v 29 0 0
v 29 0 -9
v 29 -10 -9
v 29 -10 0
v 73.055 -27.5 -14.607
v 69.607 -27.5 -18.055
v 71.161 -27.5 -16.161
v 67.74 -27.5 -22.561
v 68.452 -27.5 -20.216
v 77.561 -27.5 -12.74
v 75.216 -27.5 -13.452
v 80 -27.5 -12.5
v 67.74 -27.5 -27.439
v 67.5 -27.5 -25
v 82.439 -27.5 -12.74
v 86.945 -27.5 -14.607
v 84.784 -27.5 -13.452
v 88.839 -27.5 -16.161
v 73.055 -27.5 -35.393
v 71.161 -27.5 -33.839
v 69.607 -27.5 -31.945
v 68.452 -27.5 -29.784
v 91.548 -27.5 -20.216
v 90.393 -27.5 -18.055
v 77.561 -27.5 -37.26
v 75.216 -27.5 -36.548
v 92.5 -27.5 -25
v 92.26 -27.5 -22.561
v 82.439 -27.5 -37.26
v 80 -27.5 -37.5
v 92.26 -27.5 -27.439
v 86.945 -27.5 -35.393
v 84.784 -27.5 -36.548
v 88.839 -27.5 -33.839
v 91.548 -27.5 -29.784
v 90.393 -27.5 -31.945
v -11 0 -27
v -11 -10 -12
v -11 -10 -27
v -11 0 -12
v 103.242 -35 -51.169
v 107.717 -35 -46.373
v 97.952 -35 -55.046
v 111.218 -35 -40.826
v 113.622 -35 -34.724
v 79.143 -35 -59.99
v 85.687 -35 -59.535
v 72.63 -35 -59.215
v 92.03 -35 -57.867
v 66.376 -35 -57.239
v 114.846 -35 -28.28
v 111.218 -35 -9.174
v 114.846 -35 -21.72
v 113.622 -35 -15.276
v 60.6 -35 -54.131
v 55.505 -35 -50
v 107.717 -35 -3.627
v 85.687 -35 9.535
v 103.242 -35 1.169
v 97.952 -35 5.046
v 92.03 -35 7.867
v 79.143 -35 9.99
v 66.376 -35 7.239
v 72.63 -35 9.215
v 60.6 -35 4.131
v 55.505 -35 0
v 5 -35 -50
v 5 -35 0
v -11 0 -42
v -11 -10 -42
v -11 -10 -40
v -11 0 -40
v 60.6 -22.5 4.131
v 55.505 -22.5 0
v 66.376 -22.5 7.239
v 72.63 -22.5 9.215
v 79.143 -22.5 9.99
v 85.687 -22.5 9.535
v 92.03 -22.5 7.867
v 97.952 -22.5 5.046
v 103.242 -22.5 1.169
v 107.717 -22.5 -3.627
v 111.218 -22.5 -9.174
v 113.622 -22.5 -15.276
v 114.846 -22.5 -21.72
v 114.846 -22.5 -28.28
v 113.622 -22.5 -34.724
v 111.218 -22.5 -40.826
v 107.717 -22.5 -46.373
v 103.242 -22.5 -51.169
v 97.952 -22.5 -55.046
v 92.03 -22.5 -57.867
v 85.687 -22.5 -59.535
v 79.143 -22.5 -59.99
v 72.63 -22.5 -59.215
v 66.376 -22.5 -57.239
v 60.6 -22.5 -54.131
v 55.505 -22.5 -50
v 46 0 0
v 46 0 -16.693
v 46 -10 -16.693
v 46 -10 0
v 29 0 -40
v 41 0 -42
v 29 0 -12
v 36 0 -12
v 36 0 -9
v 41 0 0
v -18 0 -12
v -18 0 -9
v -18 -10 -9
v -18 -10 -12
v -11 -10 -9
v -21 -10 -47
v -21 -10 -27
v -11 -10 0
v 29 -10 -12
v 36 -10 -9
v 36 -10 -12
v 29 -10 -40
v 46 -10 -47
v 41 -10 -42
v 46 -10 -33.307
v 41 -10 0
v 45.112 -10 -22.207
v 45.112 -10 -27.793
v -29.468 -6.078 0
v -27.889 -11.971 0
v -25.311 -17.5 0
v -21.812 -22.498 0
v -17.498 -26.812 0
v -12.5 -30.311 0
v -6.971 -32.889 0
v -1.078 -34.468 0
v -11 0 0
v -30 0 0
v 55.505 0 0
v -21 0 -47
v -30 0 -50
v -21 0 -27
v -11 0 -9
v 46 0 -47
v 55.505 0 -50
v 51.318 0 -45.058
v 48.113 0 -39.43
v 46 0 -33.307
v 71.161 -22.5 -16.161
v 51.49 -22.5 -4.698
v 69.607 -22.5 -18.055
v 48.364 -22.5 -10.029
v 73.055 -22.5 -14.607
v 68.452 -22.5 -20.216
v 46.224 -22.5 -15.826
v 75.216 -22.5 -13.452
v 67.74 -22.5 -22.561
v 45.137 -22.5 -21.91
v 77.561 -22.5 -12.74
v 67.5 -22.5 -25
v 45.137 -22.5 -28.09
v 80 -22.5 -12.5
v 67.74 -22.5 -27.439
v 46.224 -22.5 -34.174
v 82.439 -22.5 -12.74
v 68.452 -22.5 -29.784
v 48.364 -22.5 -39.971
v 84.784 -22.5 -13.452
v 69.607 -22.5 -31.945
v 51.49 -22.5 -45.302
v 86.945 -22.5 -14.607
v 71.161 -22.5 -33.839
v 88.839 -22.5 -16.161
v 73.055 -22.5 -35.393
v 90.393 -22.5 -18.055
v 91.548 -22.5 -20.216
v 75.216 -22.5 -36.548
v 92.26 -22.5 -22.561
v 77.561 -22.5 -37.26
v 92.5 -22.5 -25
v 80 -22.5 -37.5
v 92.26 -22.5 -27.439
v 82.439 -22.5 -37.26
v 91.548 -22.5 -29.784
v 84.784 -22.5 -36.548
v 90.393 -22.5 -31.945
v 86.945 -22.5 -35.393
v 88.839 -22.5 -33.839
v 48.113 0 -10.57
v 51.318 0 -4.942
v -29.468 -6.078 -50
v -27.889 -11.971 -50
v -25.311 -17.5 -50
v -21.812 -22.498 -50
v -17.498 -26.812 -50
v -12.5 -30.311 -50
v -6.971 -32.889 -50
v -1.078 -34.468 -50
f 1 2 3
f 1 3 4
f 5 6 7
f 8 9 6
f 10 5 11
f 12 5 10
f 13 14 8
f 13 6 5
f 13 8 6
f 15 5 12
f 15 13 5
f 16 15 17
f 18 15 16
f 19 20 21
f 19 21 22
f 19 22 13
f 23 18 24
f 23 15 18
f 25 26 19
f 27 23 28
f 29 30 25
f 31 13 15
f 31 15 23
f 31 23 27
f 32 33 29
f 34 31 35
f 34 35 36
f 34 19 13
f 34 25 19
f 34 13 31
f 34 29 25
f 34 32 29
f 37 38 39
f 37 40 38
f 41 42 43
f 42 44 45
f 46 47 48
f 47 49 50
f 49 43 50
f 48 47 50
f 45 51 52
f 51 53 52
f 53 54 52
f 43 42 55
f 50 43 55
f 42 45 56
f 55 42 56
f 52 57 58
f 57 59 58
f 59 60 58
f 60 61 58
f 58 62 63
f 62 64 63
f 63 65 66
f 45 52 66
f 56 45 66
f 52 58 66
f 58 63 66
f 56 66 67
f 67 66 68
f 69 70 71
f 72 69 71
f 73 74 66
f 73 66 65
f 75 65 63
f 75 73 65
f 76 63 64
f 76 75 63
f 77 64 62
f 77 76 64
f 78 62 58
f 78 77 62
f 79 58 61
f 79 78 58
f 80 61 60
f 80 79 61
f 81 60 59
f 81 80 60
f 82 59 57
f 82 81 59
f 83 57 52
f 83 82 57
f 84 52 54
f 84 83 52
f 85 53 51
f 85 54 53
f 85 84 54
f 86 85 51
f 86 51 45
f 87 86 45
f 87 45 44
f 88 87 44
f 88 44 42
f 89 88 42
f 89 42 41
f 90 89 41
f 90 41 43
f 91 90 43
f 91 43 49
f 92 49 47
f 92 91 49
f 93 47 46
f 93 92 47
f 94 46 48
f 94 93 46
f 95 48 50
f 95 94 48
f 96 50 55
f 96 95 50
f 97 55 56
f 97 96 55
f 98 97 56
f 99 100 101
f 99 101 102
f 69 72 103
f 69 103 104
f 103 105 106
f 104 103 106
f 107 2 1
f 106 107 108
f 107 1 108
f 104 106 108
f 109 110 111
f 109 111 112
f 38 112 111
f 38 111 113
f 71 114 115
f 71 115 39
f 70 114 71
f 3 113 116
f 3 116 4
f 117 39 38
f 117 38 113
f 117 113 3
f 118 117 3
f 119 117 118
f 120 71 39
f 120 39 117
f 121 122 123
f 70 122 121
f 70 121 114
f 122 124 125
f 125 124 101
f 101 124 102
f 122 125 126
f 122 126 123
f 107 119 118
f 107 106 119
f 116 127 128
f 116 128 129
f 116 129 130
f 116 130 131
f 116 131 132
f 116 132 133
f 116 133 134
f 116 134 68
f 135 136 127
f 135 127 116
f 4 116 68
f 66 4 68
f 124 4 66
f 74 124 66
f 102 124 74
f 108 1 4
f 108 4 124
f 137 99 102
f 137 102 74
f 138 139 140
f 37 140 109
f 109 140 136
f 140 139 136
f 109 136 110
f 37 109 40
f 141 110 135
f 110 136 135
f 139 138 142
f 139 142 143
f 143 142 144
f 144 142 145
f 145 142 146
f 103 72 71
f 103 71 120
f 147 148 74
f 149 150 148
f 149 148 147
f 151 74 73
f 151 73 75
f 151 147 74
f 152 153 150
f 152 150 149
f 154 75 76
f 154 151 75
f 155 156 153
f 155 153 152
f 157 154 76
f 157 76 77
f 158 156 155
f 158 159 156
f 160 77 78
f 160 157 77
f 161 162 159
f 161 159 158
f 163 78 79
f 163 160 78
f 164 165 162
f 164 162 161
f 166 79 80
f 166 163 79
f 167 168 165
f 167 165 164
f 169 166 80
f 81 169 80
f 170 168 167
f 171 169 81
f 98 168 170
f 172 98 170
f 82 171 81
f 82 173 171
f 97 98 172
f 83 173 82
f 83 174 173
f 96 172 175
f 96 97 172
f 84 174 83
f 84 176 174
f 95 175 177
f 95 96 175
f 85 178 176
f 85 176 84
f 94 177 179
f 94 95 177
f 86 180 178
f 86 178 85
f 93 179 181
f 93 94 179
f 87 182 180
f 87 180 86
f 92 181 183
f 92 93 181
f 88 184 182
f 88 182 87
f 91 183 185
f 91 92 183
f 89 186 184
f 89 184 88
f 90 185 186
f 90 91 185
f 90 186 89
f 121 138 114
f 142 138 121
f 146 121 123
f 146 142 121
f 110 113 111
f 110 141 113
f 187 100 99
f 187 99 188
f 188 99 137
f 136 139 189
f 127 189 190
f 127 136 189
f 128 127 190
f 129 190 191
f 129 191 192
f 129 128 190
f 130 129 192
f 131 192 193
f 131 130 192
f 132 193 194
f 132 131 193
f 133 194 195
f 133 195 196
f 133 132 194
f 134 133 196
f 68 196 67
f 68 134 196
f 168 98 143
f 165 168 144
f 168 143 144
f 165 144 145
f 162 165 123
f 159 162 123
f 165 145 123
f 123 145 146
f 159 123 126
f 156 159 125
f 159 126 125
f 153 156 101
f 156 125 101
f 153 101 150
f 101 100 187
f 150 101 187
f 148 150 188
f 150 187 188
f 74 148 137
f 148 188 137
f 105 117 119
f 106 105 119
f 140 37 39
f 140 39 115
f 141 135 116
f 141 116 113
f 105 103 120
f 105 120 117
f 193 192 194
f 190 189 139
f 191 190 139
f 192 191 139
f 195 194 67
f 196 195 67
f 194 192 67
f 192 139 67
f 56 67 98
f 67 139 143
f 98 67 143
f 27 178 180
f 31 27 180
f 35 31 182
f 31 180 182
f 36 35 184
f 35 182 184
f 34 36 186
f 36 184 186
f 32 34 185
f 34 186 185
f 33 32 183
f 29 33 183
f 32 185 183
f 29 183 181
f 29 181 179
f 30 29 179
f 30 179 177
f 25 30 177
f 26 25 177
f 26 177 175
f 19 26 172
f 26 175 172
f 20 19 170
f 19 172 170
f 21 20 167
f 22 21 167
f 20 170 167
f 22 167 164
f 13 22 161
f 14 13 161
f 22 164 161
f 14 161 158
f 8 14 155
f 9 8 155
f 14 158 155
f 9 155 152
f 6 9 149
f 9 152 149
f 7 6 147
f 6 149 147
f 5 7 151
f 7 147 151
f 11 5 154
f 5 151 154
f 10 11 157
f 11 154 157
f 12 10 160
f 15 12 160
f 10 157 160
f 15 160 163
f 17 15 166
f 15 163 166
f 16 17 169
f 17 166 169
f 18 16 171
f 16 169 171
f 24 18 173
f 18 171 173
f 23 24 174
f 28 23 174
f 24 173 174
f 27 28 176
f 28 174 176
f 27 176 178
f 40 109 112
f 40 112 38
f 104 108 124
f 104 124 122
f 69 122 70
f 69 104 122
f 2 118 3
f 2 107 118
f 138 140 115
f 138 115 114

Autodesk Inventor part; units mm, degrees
ref_plane "YZ Plane" through (0, 0, 0) normal (1, 0, 0) x (0, 1, 0)
ref_plane "XZ Plane" through (0, 0, 0) normal (0, 1, 0) x (-1, 0, 0)
ref_plane "XY Plane" through (0, 0, 0) normal (0, 0, 1) x (1, 0, 0)
sketch "Sketch1" plane through (0, 0, 0) normal (0, 0, 1) x (1, 0, 0)
  line L0 (-30, 0) -> (0, 0)
  line L1 (100, 0) -> (0, 0)
  line L2 (100, 0) -> (100, -35)
  line L3 (100, -35) -> (5, -35)
  arc A0 (-30, 0) -> (5, -35) centre (5, 0) ccw
  dimension "d0" = 30
  dimension "d26" = 130
  dimension "d27" = 35
  dimension "d28" = 35
extrude "Extrusion1" add sketch "Sketch1" against normal blind 50
sketch "Sketch2" plane through (-30, 0, 0) normal (0, 1, 0) x (1, 0, 0)
  circle A0 centre (110, 25) radius 12.5
  circle A1 centre (110, 25) radius 35
  line L0 (0, 0) -> (0, 50) projected
  line L1 (0, 25) -> (130, 25)
  line L2 (130, 0) -> (130, 50) projected
  point P0 (30, 0)
  dimension "d6" = 25
  dimension "d7" = 70
  dimension "d8" = 110
extrude "Extrusion4" add sketch "Sketch2" against normal up to surface (35 mm away) contours L1 A0 | A1 | A0 L1
sketch "Sketch4" plane through (-30, 0, 0) normal (0, 1, 0) x (1, 0, 0)
  line L0 (85.5051, 0) -> (0, 0) projected
  line L1 (19, 0) -> (19, 9)
  line L2 (19, 9) -> (12, 9)
  line L3 (12, 9) -> (12, 12)
  line L4 (12, 12) -> (19, 12)
  line L5 (19, 12) -> (19, 27)
  line L6 (19, 27) -> (9, 27)
  line L7 (9, 27) -> (9, 47)
  line L8 (9, 47) -> (76, 47)
  line L9 (76, 47) -> (76, 0)
  line L10 (71, 0) -> (71, 42)
  line L11 (71, 42) -> (19, 42)
  line L12 (19, 42) -> (19, 40)
  line L13 (19, 40) -> (59, 40)
  line L14 (59, 40) -> (59, 12)
  line L15 (59, 12) -> (66, 12)
  line L16 (66, 12) -> (66, 9)
  line L17 (66, 9) -> (59, 9)
  line L18 (59, 9) -> (59, 0)
  point P0 (30, 0)
  point P1 (12, 10.5)
  point P2 (66, 10.5)
  dimension "d31" = 54
  dimension "d32" = 36
  dimension "d33" = 7
  dimension "d34" = 7
  dimension "d35" = 40
  dimension "d36" = 2
  dimension "d37" = 3
  dimension "d38" = 9
  dimension "d39" = 15
  dimension "d40" = 10
  dimension "d41" = 20
  dimension "d42" = 5
  dimension "d43" = 67
extrude "Extrusion5" cut sketch "Sketch4" against normal blind 10 contours L0 L10 L11 L12 L13 L14 L15 L16 L17 L18 L1 L2 L3 L4 L5 L6 L7 L8 L9
sketch "Sketch5" plane through (-30, 0, 0) normal (0, 1, 0) x (1, 0, 0)
  arc A0 (85.5051, 0) -> (85.5051, 50) centre (110, 25) ccw projected
  circle A1 centre (110, 25) radius 35
  circle A2 centre (110, 25) radius 12.5
  point P0 (30, 0)
  point P1 (85.5051, 50)
  point P2 (85.5051, 0)
  dimension "d46" = 25
extrude "Extrusion6" cut sketch "Sketch5" against normal blind 22.5 contours A1 A0 | A2
sketch "Sketch6" plane through (-30, -22.5, 0) normal (0, 1, 0) x (1, 0, 0)
  arc A0 (85.5051, 0) -> (85.5051, 50) centre (110, 25) ccw projected
  arc A1 (85.5051, 50) -> (85.5051, 0) centre (110, 25) ccw projected
  circle A2 centre (110, 25) radius 12.5
  point P0 (30, 0)
  dimension "d49" = 25
extrude "Extrusion7" cut sketch "Sketch6" against normal blind 5 contours A2
properties part number "wirst 2 left"
